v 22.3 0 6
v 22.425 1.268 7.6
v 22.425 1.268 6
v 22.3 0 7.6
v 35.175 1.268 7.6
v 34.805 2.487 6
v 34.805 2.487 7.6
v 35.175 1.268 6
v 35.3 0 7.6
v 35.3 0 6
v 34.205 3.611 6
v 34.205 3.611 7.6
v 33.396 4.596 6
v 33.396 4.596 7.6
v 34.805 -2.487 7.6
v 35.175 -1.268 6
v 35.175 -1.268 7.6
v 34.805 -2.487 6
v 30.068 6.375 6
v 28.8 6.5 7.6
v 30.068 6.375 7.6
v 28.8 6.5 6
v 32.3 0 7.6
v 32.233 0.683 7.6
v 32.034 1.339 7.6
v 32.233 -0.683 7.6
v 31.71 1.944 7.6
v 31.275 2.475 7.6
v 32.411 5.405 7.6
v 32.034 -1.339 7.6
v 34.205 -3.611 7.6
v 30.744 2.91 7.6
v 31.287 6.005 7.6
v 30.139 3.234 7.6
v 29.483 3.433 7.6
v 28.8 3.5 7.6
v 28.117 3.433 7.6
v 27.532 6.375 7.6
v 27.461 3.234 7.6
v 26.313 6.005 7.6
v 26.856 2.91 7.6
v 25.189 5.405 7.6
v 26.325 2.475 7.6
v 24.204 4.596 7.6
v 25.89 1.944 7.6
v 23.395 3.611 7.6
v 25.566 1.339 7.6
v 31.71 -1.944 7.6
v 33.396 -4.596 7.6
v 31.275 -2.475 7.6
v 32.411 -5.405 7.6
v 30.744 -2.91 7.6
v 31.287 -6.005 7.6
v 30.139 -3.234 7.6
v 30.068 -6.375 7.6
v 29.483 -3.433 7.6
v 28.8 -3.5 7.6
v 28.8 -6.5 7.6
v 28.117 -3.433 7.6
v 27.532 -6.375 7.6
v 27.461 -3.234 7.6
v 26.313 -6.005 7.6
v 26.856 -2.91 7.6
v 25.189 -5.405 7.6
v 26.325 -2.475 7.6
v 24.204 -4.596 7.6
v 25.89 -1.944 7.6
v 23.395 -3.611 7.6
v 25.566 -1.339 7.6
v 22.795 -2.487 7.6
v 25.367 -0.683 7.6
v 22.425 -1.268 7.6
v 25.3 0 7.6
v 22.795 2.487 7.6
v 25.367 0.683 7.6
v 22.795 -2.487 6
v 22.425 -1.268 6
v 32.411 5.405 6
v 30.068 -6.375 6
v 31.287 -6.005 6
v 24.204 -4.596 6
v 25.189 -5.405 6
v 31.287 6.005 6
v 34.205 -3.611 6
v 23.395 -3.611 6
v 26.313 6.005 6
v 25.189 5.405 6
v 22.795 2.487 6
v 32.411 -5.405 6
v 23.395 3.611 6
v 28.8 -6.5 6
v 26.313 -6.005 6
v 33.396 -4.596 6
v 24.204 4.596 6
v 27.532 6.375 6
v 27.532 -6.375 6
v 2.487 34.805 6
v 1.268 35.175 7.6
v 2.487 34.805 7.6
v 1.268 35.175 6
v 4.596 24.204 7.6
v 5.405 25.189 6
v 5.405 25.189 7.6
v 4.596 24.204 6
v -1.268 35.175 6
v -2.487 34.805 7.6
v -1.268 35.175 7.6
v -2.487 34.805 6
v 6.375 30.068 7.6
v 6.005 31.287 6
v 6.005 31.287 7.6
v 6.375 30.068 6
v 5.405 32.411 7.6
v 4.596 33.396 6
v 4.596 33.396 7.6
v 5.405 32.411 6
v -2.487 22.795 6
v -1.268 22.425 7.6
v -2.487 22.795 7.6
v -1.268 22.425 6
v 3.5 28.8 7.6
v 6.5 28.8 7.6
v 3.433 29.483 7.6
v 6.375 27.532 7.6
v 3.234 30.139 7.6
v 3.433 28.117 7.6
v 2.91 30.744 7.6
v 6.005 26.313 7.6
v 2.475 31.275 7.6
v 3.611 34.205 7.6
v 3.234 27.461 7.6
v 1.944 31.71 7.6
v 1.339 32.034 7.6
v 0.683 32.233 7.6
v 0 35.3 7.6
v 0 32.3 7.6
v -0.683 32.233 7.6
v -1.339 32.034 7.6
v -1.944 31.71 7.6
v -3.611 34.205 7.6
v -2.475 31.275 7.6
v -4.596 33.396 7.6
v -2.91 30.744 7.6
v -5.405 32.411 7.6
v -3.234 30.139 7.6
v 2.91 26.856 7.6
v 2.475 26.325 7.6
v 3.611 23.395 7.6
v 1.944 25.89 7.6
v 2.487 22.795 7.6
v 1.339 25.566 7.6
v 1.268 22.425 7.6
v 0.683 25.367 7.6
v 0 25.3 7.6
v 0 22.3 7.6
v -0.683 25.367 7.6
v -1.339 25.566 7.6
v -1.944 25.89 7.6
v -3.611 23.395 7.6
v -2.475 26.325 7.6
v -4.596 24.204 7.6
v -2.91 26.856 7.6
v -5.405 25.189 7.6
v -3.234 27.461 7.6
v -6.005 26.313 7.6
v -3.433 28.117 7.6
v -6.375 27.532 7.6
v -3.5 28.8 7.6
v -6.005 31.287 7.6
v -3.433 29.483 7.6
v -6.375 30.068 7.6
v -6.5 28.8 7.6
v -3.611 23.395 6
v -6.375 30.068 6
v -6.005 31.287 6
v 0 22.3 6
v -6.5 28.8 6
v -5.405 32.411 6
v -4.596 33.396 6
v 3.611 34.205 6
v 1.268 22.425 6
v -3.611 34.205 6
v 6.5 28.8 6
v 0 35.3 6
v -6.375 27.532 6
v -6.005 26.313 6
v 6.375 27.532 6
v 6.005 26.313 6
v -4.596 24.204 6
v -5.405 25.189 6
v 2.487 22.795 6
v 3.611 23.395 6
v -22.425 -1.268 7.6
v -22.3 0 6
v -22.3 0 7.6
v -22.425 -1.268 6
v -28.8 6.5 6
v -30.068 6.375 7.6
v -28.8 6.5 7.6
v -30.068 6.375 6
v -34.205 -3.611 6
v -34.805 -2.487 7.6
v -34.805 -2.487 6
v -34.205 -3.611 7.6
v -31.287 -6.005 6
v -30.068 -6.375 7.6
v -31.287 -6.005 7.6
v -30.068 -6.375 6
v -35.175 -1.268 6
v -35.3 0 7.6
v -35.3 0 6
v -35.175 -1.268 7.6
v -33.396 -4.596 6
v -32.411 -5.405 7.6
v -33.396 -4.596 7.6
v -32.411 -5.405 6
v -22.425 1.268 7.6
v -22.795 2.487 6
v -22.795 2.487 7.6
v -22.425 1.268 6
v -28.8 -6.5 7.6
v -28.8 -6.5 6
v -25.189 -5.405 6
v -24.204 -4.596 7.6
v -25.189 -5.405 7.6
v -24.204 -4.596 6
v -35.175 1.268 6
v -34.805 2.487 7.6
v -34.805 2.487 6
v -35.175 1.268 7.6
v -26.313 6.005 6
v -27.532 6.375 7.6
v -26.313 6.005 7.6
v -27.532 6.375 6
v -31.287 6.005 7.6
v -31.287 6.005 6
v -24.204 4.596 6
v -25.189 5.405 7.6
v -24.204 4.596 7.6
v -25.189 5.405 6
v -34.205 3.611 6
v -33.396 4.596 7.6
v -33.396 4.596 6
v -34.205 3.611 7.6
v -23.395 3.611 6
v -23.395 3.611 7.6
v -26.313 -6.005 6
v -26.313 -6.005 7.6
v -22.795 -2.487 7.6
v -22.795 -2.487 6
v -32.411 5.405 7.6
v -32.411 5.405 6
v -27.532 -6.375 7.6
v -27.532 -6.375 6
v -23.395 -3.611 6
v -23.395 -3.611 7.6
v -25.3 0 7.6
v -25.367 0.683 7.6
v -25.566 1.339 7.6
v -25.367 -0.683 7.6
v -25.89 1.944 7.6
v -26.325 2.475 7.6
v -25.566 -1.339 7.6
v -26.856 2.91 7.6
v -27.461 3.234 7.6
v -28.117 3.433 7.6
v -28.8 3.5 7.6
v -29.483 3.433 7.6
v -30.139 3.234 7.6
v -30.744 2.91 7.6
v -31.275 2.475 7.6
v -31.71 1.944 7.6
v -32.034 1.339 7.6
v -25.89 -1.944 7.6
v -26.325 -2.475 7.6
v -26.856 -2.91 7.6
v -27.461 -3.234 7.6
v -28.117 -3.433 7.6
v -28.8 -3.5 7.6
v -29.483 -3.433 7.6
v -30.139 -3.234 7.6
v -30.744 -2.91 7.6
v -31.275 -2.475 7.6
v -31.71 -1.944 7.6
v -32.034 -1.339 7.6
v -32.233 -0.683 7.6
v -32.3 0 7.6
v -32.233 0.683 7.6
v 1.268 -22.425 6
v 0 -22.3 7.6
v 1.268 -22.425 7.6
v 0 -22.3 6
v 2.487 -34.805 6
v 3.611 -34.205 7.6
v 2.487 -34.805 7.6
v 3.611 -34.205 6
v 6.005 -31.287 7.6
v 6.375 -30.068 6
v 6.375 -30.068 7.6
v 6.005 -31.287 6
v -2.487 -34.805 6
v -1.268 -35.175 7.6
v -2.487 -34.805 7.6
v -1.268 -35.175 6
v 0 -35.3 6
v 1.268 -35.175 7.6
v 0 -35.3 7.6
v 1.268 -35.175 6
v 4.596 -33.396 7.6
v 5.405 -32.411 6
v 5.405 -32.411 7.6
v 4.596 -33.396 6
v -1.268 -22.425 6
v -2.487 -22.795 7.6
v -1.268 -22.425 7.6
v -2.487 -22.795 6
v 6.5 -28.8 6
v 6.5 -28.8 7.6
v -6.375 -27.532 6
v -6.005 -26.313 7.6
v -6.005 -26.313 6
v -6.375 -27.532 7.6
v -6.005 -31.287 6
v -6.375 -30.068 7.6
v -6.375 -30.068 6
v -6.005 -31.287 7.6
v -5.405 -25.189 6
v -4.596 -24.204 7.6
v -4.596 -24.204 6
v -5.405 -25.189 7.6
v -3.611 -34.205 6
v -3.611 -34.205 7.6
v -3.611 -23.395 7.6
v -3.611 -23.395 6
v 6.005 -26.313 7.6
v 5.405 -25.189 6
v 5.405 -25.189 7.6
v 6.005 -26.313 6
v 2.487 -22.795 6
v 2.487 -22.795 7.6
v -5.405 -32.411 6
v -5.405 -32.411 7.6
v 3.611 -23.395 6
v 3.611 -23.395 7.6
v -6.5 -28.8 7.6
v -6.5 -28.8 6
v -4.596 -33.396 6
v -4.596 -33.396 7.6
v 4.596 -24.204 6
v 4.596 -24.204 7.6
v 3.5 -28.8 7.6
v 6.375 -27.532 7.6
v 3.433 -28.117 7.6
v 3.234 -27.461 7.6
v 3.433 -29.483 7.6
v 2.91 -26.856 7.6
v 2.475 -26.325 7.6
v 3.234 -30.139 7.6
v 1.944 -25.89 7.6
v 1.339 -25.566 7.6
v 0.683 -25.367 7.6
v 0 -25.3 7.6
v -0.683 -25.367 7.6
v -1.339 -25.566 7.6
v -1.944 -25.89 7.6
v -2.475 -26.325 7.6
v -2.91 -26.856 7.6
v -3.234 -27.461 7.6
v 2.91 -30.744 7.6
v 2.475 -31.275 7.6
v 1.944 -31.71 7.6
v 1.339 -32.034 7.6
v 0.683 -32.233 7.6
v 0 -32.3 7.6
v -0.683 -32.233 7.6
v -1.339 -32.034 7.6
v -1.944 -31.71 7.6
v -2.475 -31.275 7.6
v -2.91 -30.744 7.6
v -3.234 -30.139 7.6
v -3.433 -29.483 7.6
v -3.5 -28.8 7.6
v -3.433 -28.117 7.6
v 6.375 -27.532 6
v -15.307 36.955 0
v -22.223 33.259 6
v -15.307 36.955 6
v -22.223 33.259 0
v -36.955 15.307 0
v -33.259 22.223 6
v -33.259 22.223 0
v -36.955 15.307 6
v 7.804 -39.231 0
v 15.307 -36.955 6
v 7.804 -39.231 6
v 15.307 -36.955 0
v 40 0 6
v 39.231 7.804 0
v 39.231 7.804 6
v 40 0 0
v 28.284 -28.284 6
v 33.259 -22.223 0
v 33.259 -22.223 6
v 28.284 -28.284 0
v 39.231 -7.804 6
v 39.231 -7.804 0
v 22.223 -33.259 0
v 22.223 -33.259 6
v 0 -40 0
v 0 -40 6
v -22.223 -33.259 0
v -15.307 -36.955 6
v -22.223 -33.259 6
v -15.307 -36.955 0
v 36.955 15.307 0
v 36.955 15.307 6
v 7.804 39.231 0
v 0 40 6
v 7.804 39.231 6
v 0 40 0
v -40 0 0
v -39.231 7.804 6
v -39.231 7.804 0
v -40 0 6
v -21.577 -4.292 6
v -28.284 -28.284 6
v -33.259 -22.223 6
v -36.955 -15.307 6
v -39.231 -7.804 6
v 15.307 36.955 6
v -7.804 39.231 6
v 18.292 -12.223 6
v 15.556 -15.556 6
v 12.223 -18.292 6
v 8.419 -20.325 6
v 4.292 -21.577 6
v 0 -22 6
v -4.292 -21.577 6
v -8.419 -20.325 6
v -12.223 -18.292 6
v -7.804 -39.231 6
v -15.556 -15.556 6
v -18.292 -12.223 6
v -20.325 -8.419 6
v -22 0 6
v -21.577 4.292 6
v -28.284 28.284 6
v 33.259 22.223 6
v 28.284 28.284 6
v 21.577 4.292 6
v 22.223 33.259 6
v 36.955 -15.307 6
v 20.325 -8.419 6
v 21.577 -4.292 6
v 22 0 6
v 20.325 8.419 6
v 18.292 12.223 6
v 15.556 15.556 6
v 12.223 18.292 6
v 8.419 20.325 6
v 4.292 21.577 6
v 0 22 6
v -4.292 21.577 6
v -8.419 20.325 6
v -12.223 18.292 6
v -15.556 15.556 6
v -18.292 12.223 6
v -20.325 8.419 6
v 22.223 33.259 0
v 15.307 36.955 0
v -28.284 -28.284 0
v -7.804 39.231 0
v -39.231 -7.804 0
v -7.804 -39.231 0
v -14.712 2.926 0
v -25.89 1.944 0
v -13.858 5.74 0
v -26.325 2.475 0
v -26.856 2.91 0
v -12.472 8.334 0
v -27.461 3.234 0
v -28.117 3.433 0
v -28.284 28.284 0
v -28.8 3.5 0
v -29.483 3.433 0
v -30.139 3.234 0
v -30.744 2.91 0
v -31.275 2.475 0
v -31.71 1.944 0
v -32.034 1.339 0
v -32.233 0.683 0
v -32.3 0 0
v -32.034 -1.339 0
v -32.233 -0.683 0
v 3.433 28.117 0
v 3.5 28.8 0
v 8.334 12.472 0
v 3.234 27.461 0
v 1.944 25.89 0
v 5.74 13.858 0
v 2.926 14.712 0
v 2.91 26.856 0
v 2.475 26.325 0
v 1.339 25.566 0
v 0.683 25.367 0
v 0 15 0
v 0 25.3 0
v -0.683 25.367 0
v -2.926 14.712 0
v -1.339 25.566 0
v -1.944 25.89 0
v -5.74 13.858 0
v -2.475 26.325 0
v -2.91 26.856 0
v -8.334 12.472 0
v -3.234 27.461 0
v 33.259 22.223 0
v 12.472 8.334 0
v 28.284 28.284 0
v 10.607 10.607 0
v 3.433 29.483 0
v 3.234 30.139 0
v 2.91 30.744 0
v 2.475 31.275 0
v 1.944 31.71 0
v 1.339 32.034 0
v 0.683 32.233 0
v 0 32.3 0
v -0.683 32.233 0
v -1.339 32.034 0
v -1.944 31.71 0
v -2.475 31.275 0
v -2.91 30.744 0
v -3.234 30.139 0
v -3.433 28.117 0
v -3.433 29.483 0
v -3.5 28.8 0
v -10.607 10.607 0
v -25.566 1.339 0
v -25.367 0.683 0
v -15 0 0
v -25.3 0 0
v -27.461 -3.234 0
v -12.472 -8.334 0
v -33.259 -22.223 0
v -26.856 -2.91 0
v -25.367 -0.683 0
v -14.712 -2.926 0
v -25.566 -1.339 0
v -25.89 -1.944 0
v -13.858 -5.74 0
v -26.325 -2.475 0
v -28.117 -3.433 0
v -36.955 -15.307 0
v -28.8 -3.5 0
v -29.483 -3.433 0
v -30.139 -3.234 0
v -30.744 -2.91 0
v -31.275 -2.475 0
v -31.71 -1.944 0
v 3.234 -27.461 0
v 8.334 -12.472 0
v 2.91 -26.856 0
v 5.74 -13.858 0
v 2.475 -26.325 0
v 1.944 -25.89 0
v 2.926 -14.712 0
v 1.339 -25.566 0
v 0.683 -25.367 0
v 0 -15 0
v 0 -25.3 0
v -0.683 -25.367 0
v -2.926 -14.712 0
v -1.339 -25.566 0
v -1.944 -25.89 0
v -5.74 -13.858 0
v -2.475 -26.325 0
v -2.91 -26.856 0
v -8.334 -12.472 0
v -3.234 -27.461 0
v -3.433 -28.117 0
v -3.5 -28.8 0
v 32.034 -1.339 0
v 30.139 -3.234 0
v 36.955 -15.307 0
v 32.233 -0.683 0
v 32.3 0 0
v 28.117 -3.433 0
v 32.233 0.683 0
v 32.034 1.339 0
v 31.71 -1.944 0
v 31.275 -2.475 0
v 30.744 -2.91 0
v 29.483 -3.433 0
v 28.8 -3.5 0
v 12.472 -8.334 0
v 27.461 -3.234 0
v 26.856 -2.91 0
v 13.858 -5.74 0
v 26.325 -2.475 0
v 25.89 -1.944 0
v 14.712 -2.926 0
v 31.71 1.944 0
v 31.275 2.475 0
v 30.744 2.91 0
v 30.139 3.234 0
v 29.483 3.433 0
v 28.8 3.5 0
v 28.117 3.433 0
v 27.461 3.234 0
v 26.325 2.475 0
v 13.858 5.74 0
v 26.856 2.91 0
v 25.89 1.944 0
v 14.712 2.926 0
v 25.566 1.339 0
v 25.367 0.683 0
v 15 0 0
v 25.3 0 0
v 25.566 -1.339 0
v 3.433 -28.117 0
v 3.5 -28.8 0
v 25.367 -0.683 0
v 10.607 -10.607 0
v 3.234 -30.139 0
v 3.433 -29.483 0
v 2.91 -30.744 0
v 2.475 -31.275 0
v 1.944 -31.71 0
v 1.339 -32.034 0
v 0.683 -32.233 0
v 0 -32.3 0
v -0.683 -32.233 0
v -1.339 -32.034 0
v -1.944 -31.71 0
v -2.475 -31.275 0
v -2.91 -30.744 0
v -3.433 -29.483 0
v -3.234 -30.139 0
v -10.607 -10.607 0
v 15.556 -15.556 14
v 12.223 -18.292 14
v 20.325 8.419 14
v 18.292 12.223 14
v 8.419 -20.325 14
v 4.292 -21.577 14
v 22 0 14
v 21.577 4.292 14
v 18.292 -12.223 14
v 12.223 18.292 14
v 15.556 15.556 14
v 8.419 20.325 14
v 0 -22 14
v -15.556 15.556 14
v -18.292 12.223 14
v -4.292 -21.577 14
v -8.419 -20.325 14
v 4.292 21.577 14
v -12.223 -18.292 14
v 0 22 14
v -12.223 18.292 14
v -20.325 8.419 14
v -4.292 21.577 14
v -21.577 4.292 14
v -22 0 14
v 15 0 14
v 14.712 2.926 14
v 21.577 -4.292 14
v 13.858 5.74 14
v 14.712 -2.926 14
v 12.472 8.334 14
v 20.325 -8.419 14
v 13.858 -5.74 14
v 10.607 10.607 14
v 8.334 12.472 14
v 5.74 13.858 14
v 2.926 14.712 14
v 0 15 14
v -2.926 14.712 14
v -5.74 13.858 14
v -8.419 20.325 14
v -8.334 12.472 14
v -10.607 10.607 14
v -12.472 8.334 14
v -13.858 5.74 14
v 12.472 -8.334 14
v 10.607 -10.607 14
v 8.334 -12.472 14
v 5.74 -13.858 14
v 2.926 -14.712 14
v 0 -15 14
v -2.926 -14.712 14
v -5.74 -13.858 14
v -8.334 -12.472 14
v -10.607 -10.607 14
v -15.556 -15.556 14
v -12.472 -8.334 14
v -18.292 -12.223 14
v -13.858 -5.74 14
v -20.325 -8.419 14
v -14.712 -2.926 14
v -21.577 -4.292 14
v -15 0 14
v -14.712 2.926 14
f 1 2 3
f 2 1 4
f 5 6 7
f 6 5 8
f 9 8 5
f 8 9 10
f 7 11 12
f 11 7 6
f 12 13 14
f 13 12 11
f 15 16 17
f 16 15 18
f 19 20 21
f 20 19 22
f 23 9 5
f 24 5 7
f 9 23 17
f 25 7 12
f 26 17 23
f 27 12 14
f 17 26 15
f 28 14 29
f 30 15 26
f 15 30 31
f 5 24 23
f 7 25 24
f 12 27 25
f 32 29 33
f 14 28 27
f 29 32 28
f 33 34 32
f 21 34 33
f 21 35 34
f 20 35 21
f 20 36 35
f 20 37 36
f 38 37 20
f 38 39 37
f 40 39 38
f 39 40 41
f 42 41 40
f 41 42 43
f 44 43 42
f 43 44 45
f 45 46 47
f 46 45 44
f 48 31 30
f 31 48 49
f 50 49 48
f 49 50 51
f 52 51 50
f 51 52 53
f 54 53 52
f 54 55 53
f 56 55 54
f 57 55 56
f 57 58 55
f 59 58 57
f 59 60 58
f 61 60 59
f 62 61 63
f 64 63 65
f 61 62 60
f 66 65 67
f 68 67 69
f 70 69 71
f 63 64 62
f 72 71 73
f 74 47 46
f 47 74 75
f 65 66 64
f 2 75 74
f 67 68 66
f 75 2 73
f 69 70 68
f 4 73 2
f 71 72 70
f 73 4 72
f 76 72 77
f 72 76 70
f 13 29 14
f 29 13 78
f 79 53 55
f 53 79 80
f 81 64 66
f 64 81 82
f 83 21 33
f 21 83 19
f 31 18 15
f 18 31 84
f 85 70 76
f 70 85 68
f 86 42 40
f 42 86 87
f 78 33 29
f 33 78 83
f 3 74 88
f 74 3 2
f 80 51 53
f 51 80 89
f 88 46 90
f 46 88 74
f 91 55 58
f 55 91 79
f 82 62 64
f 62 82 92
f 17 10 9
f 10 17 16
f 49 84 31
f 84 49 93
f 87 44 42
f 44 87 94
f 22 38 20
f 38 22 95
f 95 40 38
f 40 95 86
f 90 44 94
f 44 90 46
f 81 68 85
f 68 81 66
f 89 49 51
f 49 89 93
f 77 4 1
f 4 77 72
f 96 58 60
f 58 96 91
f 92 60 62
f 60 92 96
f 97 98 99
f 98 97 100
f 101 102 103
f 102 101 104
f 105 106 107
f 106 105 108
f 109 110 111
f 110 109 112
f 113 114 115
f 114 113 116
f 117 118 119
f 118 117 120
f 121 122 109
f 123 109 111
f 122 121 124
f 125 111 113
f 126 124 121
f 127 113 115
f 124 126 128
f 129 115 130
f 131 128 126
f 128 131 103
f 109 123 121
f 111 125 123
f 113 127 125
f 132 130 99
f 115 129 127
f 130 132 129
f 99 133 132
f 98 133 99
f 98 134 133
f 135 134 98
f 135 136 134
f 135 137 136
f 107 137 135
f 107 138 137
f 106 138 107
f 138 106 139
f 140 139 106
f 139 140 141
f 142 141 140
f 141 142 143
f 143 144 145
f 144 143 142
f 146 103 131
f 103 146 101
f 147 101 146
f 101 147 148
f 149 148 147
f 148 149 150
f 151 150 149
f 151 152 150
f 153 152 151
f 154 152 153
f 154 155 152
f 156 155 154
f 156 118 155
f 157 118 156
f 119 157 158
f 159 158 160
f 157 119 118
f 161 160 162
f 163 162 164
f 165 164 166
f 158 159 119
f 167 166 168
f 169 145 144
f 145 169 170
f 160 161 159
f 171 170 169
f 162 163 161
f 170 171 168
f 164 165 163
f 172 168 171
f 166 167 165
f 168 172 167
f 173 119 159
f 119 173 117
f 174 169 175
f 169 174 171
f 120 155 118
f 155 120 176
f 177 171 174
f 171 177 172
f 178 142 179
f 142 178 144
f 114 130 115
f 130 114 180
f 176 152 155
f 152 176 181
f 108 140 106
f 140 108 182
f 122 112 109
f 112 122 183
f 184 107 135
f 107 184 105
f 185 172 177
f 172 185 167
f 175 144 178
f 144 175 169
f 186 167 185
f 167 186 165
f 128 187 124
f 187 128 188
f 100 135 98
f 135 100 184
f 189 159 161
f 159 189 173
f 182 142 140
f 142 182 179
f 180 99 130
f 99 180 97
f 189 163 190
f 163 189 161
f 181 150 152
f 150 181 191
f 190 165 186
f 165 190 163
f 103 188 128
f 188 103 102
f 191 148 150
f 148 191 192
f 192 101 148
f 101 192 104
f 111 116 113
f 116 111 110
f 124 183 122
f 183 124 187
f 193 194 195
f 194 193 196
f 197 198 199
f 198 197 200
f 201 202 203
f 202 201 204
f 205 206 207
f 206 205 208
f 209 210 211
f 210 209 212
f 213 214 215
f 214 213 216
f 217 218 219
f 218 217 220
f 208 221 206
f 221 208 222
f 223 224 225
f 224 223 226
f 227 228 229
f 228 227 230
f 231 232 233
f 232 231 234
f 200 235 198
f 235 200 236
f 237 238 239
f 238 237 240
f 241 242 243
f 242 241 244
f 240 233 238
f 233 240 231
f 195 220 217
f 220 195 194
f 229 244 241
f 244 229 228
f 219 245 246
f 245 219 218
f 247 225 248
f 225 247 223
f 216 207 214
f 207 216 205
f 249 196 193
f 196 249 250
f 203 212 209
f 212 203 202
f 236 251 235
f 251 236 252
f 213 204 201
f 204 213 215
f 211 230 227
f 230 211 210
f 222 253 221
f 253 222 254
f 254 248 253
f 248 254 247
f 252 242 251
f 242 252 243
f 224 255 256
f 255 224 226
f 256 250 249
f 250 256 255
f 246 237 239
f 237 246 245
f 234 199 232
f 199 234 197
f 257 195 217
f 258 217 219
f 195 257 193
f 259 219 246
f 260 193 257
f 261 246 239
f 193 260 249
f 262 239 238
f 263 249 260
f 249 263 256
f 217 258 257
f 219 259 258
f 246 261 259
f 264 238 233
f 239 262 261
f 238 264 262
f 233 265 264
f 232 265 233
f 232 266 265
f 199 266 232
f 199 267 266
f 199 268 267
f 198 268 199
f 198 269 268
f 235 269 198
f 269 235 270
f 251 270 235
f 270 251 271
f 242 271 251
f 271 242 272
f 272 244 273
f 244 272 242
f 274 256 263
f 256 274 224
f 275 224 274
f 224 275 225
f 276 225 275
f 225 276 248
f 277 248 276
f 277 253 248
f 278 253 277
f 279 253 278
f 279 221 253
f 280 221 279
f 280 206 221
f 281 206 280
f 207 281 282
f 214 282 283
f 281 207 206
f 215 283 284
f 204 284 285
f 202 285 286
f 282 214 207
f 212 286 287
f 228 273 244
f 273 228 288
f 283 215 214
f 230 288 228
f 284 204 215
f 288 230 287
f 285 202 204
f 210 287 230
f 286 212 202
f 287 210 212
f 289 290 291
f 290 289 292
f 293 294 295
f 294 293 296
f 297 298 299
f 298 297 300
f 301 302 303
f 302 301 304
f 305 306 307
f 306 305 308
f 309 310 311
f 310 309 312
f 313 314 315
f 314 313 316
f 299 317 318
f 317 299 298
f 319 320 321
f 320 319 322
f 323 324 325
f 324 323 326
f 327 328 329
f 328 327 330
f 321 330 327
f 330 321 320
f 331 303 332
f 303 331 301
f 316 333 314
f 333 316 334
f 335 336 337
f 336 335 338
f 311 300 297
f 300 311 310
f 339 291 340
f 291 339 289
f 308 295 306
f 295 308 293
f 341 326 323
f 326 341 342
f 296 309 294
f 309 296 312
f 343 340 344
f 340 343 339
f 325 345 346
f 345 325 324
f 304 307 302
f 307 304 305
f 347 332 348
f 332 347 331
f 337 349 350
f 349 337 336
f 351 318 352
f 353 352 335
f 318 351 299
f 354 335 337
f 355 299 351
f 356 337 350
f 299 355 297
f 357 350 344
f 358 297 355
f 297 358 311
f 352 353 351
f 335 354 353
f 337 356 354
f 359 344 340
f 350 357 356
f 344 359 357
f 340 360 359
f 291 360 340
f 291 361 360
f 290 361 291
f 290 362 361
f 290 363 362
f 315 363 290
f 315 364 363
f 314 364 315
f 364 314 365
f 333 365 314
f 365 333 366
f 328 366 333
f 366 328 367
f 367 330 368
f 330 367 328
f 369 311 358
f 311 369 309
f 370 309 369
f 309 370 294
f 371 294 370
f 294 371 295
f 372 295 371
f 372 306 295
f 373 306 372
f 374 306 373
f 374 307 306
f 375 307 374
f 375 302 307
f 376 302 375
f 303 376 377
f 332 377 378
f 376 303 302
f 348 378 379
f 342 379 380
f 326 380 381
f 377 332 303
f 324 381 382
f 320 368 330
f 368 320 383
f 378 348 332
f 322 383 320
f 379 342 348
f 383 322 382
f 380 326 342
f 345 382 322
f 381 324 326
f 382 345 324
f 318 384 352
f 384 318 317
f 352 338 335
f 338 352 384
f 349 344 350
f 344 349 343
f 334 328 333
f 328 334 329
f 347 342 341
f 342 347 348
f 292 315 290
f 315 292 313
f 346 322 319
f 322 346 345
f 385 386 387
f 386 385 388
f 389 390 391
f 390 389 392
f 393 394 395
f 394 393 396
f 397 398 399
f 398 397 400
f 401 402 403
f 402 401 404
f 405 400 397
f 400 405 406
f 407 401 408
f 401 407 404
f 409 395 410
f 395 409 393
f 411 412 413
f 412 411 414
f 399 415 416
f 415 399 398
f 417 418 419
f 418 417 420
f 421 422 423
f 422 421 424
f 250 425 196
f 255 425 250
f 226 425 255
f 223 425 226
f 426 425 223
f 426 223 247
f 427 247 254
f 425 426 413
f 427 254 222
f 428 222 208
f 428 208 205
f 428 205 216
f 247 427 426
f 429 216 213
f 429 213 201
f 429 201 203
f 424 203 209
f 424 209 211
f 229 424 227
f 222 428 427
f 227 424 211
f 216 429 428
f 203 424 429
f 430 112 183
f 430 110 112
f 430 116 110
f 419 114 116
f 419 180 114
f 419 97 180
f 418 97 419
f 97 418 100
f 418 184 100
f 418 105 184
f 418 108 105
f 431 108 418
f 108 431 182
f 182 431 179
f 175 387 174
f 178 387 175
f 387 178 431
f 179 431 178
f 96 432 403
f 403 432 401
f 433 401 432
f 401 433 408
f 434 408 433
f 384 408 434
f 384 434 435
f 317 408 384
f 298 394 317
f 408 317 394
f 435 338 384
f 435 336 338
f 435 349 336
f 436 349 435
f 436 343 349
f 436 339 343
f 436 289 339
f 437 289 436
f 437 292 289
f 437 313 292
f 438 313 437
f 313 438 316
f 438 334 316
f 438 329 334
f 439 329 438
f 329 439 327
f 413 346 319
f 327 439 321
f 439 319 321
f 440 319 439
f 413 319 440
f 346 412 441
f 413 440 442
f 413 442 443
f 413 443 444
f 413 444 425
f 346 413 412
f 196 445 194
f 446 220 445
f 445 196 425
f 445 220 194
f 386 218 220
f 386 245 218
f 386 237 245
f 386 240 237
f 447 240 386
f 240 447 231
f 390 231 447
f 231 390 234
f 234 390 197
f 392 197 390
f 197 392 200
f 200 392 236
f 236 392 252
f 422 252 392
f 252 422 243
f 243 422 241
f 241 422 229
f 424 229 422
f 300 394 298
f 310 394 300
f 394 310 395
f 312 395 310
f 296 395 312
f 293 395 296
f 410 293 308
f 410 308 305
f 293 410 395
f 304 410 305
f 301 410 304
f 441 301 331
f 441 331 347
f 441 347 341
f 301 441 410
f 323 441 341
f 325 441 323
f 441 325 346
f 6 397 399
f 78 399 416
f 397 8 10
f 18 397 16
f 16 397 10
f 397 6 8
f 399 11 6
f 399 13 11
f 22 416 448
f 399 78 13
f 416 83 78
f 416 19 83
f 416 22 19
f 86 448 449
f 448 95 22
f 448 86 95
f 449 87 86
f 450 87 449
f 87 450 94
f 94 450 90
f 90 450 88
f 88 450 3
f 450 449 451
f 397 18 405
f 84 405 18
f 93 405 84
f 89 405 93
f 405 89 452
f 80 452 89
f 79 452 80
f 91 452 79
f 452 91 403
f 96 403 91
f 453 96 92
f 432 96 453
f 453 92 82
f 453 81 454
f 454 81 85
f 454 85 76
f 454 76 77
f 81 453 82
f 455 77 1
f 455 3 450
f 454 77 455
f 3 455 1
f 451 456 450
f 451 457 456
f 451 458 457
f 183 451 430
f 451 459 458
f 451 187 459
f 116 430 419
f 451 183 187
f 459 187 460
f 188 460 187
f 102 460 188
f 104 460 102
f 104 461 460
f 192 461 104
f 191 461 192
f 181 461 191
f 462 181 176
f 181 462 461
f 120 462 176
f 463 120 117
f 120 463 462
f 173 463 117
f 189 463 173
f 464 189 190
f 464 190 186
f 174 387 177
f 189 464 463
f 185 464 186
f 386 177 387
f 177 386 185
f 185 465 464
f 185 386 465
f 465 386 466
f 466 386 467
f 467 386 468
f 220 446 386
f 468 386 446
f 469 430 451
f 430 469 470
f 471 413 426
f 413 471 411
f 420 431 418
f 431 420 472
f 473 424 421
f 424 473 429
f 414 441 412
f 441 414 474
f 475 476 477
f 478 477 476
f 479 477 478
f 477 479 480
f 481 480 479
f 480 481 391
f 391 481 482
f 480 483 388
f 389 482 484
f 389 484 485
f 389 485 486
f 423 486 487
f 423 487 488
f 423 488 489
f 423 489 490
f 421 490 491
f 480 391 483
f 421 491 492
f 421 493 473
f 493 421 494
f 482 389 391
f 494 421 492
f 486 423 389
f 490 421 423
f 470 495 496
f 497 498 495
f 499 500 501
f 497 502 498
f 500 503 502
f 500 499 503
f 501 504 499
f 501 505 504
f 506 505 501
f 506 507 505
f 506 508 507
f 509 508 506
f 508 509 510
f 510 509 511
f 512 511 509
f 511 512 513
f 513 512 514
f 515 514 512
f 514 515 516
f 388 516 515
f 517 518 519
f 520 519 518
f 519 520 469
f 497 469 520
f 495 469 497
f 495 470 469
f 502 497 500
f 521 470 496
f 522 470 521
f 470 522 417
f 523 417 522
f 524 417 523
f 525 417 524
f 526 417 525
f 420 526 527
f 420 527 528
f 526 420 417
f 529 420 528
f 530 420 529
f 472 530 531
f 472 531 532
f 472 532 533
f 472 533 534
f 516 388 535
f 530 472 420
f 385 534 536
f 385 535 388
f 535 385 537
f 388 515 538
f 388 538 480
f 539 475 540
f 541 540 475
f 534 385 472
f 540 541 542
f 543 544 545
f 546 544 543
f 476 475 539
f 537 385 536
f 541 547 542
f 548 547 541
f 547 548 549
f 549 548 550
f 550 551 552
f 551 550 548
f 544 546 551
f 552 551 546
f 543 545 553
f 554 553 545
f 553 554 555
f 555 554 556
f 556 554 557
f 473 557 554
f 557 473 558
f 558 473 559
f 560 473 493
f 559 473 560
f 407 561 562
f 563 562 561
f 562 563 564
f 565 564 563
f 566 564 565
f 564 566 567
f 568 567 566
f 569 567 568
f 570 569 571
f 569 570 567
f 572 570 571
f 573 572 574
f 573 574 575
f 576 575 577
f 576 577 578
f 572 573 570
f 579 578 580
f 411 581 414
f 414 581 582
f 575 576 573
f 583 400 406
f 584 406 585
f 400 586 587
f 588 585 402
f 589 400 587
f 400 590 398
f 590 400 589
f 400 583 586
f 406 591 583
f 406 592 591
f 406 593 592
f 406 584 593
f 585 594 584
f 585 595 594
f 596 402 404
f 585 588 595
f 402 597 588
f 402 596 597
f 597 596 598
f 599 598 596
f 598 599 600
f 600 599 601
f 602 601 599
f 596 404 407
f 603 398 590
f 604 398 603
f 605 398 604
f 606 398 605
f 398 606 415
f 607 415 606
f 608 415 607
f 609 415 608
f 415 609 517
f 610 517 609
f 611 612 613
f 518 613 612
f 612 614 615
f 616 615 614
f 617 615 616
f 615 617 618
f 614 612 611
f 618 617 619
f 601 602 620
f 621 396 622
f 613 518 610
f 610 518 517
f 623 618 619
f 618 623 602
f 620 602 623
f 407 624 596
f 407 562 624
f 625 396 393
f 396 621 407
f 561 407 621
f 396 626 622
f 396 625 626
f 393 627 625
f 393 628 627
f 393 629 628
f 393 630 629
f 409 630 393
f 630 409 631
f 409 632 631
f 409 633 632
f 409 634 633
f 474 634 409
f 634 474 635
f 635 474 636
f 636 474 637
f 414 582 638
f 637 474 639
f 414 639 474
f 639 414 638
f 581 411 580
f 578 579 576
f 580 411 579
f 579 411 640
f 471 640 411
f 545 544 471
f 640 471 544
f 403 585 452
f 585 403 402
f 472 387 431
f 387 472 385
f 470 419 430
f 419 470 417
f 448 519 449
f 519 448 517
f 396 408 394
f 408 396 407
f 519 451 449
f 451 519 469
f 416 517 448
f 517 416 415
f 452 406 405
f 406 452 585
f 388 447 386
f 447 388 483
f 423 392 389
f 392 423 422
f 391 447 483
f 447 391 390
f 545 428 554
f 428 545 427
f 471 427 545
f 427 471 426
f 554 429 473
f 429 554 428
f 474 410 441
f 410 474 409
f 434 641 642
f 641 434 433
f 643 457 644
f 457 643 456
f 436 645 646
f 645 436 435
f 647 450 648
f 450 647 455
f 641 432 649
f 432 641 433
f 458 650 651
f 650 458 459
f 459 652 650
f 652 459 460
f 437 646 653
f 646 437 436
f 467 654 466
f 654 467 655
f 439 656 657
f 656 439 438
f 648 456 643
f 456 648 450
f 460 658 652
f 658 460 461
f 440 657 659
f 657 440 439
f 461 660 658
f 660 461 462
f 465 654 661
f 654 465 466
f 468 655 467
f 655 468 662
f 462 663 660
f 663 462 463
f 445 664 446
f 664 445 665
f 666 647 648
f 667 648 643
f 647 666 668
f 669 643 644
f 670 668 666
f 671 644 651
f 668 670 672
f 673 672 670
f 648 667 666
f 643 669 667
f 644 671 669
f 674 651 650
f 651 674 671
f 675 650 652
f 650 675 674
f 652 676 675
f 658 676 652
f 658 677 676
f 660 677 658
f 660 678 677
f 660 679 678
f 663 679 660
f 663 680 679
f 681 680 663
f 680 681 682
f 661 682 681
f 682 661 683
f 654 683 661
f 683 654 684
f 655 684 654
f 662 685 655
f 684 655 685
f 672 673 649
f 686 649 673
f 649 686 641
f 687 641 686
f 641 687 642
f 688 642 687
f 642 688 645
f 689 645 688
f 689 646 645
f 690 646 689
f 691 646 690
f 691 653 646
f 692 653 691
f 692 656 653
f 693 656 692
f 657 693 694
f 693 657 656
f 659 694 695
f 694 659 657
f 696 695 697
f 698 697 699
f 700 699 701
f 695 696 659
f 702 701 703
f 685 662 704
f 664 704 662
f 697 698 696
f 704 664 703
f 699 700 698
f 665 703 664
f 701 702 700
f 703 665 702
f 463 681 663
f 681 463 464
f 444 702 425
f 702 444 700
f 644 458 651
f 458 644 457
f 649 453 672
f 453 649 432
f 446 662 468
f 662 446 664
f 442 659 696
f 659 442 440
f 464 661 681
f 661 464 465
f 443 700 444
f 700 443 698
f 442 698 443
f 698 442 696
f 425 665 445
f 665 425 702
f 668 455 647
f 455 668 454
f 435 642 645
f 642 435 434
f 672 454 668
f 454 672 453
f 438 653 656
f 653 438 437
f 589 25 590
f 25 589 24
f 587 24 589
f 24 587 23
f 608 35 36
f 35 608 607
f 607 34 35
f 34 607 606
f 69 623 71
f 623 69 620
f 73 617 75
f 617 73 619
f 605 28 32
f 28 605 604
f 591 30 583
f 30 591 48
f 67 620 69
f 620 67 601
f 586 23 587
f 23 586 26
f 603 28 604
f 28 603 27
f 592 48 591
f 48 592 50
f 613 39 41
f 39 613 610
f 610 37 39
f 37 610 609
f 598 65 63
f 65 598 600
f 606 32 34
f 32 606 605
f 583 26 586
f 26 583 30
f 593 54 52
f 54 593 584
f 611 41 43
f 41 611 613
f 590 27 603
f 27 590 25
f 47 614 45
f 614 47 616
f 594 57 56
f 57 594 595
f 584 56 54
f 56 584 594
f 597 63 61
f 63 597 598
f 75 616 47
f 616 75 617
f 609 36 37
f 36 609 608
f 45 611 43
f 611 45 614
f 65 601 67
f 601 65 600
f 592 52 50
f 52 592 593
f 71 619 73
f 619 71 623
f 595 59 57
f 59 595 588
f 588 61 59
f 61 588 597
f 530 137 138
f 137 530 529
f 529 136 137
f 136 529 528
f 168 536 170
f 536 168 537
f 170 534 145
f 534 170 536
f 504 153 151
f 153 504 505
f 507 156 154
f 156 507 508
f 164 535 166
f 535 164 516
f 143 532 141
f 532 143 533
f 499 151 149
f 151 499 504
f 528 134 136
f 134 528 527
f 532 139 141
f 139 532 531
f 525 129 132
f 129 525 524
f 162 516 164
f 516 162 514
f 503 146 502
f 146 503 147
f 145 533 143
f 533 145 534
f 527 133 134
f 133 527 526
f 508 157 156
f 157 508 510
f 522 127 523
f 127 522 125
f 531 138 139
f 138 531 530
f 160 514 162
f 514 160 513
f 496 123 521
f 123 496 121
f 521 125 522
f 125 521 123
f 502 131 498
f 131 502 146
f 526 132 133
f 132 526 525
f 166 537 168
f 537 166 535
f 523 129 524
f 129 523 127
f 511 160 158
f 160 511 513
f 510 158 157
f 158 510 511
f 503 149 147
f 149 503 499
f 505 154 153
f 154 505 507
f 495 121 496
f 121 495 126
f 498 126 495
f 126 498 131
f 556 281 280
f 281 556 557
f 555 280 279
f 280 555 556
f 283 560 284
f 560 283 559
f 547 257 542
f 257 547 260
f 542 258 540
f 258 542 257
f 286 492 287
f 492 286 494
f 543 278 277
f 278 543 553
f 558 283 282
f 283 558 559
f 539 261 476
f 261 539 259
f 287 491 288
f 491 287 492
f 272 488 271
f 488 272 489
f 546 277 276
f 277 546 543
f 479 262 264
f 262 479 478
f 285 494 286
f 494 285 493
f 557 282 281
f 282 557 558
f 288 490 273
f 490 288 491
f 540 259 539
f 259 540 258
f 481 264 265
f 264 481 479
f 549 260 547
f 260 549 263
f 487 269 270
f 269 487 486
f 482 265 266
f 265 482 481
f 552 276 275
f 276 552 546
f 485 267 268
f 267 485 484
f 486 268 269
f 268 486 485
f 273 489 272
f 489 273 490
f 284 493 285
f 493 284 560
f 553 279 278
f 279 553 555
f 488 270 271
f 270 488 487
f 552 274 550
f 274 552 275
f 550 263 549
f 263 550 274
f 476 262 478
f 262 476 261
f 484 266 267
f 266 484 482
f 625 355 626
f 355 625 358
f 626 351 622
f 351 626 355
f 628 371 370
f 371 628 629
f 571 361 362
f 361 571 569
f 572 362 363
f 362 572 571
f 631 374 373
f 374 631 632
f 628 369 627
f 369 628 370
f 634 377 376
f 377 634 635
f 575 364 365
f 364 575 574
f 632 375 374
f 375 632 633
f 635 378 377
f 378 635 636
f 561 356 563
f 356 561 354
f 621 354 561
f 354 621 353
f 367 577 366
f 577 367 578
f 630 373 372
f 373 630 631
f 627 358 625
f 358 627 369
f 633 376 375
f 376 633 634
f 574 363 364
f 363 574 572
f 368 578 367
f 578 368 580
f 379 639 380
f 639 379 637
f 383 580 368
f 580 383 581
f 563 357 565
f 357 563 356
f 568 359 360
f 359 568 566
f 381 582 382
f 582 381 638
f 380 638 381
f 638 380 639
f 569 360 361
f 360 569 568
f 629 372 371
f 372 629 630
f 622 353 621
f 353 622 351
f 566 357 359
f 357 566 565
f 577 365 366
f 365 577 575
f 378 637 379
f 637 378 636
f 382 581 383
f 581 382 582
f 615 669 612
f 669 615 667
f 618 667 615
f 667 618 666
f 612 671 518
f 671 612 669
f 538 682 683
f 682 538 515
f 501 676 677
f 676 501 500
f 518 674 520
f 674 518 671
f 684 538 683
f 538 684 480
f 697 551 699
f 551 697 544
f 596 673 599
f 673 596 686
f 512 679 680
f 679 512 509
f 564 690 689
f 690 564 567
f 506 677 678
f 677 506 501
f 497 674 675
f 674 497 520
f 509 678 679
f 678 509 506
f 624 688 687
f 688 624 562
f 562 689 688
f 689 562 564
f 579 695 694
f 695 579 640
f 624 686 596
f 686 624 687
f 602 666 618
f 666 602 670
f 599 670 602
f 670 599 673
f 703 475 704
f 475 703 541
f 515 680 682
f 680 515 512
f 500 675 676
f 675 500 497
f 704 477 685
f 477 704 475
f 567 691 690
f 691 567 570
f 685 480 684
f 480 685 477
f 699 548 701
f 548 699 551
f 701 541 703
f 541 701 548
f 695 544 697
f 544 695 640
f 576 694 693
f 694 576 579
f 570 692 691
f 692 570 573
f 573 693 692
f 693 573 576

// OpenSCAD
$fn = 32;

// ----------------------------------------------------------------------
// Bolt-circle flange: 80 mm outside, 4 bolt holes, bore 30 mm
// ----------------------------------------------------------------------

// --- parameters (mm) ---
flange_d = 80;            // flange outside diameter
flange_t = 6;             // flange thickness
bolts = 4;                // number of bolt holes
bolt_d = 7;               // bolt clearance
bolt_r = 28.8;            // bolt circle radius
bore_d = 30;              // centre bore
hub_d = 44;               // raised hub diameter
hub_h = 8;                // raised hub height
spot_d = 13;              // spot faced bosses
spot_h = 1.6;             // spot face height

module body() {
  cylinder(h = flange_t, d = flange_d);
  /* raised hub, sunk 1 mm into the flange */
  translate([0, 0, flange_t - 1]) cylinder(h = hub_h + 1, d = hub_d);
  /* spot faced pads under the bolt heads */
  for (i = [0 : bolts - 1]) rotate([0, 0, i * 360 / bolts]) translate([bolt_r, 0, flange_t - 1]) cylinder(h = spot_h + 1, d = spot_d);
}

difference() {
  body();
  /* bolt circle */
  for (i = [0 : bolts - 1]) rotate([0, 0, i * 360 / bolts]) translate([bolt_r, 0, -1]) cylinder(h = flange_t + hub_h + 3, d = bolt_d);
  translate([0, 0, -1]) cylinder(h = flange_t + hub_h + 3, d = bore_d);
}
